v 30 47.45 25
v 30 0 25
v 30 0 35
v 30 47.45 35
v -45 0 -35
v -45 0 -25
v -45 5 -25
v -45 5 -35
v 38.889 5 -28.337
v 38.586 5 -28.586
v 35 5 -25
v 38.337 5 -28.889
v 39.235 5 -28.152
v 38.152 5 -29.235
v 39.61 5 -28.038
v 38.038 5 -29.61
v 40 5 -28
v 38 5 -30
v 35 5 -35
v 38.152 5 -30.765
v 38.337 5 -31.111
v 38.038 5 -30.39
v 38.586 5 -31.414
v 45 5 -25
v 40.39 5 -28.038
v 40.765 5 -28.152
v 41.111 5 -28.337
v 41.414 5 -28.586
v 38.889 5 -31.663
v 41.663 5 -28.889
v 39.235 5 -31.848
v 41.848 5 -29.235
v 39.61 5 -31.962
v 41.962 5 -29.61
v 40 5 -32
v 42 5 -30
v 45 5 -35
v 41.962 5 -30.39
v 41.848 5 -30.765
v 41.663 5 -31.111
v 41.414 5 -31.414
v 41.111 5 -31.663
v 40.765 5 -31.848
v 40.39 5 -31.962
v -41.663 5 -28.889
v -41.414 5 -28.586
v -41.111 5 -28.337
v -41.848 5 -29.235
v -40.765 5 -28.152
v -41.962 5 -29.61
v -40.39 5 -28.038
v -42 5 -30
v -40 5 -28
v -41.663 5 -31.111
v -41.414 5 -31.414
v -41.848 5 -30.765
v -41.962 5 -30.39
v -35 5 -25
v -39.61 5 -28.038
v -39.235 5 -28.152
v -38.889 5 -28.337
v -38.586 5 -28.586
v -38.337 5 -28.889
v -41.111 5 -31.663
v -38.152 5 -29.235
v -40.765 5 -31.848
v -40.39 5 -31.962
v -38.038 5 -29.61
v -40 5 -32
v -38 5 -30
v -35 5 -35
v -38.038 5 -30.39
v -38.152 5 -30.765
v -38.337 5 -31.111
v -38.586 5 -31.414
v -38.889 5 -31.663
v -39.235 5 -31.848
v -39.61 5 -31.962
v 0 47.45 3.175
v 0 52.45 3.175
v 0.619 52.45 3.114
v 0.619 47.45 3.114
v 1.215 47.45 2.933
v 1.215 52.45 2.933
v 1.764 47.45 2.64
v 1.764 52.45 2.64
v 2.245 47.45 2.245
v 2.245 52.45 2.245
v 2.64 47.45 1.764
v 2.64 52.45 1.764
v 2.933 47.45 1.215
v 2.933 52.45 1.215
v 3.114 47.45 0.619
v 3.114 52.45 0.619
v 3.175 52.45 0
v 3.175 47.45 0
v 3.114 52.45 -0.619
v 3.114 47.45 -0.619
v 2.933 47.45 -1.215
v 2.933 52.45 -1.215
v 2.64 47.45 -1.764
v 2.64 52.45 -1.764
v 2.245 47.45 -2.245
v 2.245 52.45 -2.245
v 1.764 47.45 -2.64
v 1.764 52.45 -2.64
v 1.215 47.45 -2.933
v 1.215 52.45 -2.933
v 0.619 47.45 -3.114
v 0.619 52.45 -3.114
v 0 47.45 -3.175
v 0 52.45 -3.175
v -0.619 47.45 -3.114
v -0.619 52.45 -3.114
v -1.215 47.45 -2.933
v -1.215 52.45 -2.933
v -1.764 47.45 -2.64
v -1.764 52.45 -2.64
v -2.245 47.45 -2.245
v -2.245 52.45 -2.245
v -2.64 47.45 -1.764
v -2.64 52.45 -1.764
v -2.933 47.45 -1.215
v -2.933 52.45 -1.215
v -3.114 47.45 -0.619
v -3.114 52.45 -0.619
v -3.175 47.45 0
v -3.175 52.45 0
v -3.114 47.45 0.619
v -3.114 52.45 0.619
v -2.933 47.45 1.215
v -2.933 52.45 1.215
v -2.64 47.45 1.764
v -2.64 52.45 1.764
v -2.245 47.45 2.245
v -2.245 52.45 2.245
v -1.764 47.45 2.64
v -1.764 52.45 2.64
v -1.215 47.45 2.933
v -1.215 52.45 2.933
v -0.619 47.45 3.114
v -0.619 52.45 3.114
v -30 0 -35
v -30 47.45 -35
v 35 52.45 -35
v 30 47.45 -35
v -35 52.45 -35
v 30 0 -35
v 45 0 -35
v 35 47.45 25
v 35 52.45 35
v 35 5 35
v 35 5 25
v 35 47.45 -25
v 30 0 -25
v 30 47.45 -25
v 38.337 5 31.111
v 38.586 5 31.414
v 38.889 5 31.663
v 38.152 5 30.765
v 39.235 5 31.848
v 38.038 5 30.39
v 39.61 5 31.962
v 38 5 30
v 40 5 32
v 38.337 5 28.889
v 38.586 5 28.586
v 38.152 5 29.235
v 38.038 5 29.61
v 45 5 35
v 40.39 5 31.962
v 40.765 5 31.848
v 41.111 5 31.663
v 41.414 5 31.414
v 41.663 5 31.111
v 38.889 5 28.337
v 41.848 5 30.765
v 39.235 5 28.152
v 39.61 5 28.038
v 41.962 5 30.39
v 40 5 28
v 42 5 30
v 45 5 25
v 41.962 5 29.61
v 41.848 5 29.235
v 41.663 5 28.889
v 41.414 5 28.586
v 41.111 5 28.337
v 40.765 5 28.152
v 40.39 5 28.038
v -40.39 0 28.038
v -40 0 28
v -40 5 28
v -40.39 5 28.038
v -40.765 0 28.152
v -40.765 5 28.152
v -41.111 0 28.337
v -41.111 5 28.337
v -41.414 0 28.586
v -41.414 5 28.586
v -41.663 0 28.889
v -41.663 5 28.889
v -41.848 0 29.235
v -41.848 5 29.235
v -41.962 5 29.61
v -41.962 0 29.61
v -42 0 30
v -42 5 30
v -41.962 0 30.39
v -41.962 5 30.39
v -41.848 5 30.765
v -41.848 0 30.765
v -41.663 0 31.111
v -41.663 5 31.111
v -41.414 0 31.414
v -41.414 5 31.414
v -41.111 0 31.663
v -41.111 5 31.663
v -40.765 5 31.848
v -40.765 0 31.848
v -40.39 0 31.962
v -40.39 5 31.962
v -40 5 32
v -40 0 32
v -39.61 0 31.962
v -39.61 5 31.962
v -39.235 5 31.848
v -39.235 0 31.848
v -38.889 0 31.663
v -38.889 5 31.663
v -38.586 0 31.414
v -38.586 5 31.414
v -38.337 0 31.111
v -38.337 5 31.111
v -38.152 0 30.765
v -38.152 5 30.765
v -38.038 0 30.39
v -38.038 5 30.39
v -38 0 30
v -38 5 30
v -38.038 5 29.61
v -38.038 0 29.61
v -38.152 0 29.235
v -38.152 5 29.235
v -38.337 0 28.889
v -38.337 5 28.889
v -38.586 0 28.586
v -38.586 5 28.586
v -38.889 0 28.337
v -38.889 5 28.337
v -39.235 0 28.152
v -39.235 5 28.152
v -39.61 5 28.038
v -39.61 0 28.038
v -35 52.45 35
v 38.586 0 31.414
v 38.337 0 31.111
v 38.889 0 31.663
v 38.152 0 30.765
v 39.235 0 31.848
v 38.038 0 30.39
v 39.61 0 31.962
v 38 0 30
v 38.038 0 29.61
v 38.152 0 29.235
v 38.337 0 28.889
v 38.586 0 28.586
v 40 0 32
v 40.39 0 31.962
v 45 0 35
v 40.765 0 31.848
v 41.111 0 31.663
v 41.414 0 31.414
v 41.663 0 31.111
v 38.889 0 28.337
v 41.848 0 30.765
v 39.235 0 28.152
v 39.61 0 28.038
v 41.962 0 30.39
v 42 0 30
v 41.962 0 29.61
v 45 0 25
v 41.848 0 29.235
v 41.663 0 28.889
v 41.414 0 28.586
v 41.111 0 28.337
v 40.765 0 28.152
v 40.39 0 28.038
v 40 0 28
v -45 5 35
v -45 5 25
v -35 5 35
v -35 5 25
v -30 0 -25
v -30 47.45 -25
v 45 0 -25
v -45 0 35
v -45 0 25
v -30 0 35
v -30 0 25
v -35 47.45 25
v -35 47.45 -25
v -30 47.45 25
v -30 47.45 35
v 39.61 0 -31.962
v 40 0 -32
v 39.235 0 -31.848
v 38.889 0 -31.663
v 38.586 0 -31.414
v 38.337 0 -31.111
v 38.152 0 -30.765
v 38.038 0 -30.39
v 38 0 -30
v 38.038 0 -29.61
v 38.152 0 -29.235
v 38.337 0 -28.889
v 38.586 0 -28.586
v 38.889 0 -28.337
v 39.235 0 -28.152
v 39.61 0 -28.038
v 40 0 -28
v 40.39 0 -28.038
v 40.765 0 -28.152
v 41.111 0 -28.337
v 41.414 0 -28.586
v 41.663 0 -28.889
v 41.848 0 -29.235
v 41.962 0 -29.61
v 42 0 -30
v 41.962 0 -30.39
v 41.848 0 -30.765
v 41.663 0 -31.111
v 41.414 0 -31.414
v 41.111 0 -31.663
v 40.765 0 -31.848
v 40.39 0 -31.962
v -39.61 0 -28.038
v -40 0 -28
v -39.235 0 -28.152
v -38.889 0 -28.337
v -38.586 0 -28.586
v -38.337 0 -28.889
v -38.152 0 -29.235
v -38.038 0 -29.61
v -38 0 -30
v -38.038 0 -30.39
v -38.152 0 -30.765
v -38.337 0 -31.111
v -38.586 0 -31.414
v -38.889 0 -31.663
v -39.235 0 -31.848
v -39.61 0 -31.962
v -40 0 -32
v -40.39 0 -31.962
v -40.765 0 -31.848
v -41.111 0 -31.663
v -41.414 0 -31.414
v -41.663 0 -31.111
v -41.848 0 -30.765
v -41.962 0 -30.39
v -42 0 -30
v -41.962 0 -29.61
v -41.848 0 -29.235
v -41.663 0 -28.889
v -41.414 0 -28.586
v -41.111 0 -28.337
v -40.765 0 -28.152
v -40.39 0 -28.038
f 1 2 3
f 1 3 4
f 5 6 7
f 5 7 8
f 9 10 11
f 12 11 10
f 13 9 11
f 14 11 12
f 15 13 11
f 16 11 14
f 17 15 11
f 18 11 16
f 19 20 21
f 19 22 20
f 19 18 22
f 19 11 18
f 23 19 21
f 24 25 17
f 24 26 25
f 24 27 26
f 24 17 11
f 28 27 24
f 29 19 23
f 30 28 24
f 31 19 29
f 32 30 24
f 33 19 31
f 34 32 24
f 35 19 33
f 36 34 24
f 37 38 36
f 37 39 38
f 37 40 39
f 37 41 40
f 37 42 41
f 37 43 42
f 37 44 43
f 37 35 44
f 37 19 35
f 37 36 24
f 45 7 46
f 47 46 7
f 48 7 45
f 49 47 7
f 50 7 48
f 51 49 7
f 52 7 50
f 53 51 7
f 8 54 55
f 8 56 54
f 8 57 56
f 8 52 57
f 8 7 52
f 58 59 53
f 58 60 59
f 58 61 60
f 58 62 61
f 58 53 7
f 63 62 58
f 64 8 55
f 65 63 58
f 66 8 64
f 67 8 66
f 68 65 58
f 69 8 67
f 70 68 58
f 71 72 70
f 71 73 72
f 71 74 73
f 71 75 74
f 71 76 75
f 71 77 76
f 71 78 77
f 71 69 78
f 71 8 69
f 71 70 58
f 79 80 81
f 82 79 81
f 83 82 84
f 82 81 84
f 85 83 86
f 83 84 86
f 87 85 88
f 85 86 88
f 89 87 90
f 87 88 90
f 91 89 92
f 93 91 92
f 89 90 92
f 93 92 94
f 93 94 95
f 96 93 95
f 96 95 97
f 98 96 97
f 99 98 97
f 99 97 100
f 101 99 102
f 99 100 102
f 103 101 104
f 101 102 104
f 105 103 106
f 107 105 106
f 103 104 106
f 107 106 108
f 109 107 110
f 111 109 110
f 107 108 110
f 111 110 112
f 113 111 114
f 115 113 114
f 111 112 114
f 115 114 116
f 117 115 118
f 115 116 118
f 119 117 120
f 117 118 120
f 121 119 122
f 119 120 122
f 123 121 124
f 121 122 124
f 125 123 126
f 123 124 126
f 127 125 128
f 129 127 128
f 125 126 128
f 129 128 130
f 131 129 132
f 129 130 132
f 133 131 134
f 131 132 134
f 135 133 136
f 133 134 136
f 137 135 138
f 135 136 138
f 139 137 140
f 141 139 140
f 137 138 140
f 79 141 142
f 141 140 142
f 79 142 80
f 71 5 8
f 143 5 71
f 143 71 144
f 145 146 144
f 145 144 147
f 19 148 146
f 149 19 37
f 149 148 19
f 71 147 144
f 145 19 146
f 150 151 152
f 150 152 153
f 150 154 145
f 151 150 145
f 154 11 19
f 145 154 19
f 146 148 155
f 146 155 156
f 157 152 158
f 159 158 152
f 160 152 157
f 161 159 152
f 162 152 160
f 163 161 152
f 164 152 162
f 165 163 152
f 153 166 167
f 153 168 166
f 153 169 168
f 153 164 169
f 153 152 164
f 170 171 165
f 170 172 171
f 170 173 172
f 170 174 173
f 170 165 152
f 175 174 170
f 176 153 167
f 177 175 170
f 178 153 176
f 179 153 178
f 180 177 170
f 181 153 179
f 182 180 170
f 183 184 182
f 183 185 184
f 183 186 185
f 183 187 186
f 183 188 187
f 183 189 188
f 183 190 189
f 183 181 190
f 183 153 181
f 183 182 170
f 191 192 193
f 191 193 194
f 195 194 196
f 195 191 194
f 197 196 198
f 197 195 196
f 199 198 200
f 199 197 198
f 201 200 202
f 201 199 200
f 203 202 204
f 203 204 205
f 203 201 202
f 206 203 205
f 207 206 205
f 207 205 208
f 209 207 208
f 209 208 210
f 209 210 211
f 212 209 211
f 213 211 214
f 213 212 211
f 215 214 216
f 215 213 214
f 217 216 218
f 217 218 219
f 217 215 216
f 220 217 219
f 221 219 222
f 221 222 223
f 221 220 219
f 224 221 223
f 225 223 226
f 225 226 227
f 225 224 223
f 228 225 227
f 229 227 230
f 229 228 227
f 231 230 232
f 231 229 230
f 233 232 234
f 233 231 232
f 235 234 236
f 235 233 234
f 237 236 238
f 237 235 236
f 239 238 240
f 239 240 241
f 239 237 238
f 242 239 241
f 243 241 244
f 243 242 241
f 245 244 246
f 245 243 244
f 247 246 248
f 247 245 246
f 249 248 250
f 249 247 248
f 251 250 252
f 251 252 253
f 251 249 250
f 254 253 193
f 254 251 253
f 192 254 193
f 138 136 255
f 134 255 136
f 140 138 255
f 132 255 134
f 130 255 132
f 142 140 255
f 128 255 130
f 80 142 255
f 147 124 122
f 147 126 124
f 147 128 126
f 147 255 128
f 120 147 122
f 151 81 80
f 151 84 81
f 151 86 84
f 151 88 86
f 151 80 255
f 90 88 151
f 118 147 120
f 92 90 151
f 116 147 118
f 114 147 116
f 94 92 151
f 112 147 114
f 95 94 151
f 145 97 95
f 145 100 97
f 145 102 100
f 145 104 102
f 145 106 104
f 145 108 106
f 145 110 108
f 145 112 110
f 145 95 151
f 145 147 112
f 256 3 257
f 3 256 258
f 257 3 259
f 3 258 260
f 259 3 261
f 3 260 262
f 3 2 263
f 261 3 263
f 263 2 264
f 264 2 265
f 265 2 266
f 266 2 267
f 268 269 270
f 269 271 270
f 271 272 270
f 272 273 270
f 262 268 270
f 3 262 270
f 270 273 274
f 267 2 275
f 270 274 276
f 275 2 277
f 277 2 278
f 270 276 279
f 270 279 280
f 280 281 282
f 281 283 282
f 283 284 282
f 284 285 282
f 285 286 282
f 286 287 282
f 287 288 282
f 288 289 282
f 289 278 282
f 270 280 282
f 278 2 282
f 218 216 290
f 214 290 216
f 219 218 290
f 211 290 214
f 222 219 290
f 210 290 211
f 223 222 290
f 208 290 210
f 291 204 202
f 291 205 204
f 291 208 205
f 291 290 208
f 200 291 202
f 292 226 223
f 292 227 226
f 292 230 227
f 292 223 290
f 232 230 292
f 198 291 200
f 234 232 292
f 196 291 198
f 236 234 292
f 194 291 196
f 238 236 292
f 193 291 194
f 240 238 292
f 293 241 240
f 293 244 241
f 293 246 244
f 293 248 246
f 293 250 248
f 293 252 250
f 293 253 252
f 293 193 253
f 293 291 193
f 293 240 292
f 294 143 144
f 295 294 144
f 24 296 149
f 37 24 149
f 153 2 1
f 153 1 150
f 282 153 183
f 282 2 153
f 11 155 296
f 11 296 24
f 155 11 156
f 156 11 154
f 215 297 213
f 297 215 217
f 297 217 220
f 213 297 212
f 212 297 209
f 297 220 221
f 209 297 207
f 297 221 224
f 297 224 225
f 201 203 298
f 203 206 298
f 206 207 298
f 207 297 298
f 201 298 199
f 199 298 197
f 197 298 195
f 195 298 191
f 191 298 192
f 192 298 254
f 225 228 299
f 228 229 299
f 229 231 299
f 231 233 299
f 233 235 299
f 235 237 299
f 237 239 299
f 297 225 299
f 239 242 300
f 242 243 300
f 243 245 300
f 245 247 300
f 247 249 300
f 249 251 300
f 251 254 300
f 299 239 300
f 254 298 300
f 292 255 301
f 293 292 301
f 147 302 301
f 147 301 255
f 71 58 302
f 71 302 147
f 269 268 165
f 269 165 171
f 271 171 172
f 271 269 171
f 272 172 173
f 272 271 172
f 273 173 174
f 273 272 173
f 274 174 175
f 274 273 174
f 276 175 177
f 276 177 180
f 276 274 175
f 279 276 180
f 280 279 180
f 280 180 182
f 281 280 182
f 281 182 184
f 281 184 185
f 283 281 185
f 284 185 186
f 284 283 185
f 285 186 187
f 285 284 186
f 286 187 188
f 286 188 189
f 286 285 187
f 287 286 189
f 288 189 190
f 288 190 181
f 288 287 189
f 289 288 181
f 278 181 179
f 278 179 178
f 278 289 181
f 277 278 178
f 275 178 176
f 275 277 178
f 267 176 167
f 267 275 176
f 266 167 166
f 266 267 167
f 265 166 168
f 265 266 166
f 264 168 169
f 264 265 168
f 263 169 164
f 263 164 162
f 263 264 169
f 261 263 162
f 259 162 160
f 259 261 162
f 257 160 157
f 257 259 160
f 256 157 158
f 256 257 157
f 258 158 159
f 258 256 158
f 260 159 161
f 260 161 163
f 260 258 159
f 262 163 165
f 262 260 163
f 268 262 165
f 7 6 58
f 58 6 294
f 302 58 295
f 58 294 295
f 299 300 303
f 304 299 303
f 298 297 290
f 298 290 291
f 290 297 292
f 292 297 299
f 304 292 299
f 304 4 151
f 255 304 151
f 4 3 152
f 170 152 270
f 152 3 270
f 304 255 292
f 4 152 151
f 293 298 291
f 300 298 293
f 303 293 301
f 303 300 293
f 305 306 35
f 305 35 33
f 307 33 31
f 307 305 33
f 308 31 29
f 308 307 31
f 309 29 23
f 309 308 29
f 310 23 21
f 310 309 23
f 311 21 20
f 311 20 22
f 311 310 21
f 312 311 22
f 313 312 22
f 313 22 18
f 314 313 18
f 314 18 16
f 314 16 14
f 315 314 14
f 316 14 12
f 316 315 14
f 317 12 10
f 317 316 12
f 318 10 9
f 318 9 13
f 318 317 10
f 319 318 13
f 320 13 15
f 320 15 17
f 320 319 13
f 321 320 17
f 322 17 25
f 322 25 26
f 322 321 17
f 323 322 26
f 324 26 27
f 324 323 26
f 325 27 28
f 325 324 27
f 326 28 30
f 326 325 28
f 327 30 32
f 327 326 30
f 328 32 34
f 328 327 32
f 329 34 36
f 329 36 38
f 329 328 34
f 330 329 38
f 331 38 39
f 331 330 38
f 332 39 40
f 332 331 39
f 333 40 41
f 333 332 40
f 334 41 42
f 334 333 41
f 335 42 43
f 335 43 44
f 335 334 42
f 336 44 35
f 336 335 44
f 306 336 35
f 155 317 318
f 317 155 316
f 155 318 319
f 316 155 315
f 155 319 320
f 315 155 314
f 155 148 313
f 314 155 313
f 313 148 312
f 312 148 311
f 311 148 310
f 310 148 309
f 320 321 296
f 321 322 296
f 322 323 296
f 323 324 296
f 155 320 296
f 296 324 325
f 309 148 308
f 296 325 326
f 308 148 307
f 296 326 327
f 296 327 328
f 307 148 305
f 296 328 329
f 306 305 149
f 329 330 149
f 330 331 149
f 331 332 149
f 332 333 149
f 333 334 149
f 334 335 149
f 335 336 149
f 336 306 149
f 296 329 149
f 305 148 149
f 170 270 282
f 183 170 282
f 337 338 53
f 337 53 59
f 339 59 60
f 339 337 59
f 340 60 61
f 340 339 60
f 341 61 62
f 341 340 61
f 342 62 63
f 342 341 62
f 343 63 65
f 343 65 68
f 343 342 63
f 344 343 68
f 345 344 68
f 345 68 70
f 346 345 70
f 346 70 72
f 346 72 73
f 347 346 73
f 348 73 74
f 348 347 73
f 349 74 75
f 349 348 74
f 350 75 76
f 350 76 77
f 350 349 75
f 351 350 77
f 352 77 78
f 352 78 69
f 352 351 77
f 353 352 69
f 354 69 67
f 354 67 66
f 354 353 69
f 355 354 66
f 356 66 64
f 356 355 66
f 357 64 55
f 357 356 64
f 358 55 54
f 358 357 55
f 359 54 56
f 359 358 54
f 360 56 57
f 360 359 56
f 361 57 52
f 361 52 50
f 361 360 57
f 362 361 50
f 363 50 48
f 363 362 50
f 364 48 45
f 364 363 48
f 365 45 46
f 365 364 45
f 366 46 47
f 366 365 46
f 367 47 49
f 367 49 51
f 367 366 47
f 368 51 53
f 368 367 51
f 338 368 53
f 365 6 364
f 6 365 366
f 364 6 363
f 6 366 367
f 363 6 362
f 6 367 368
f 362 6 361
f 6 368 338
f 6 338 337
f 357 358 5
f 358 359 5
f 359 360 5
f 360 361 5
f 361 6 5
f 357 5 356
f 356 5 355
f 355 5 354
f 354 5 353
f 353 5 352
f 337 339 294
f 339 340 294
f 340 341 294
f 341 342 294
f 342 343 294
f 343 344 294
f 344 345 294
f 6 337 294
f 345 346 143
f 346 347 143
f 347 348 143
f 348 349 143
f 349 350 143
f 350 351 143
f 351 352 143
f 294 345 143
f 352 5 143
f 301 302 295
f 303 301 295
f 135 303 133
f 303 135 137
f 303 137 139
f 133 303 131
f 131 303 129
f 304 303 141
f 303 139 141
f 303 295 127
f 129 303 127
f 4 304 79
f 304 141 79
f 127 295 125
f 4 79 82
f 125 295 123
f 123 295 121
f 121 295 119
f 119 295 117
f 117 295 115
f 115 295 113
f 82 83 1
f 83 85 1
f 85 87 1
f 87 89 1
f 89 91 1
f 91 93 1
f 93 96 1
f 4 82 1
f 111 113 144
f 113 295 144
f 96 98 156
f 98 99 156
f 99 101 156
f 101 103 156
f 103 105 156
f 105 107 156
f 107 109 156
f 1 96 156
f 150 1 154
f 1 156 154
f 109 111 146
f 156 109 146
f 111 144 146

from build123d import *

# Parameters (mm, degrees)
SKETCH1_W               = 70
SKETCH1_H               = 70
BOSS_EXTRUDE1_DEPTH     = 52.45
CUT_EXTRUDE2_DEPTH      = 95.212538974
CUT_EXTRUDE2_DEPTH_BACK = 70
SKETCH2_W               = 60
SKETCH2_H               = 47.45
SKETCH3_W               = 10
SKETCH3_H               = 10
SKETCH3_R               = 2
BOSS_EXTRUDE2_DEPTH     = 5
SKETCH4_R               = 3.175
CUT_EXTRUDE3_DEPTH      = 5
SKETCH5_W               = 50
SKETCH5_H               = 47.45
CUT_EXTRUDE4_DEPTH      = 80


with BuildPart() as part:
    # Sketch1 → Boss-Extrude1 (new body)
    with BuildSketch(Plane(origin=(0, 0, 0), x_dir=(1, 0, 0), z_dir=(0, 1, 0))):
        Rectangle(SKETCH1_W, SKETCH1_H)
    extrude(amount=BOSS_EXTRUDE1_DEPTH)

    # Sketch2 → Cut-Extrude2 (cut, two sides: drawn at the far end of the back side and taken through both)
    with BuildSketch(Plane.XY.offset(35).offset(-CUT_EXTRUDE2_DEPTH_BACK)):
        with Locations((0, 23.725)):
            Rectangle(SKETCH2_W, SKETCH2_H)
    extrude(amount=CUT_EXTRUDE2_DEPTH + CUT_EXTRUDE2_DEPTH_BACK, mode=Mode.SUBTRACT)

    # Sketch3 → Boss-Extrude2 (add)
    # profile 1 of 4: a face of its own
    with BuildSketch(Plane(origin=(0, 0, 0), x_dir=(1, 0, 0), z_dir=(0, 1, 0))):
        with Locations((40, -30)):
            Rectangle(SKETCH3_W, SKETCH3_H)
        with Locations(Location((40, -30, 0), (0, 0, 270))):
            Circle(SKETCH3_R, mode=Mode.SUBTRACT)
    # profile 2 of 4: a face of its own
    with BuildSketch(Plane(origin=(0, 0, 0), x_dir=(1, 0, 0), z_dir=(0, 1, 0))):
        with Locations((40, 30)):
            Rectangle(SKETCH3_W, SKETCH3_H)
        with Locations(Location((40, 30, 0), (0, 0, 90))):
            Circle(SKETCH3_R, mode=Mode.SUBTRACT)
    # profile 3 of 4: a face of its own
    with BuildSketch(Plane(origin=(0, 0, 0), x_dir=(1, 0, 0), z_dir=(0, 1, 0))):
        with Locations((-40, -30)):
            Rectangle(SKETCH3_W, SKETCH3_H)
        with Locations(Location((-40, -30, 0), (0, 0, 90))):
            Circle(SKETCH3_R, mode=Mode.SUBTRACT)
    # profile 4 of 4: a face of its own
    with BuildSketch(Plane(origin=(0, 0, 0), x_dir=(1, 0, 0), z_dir=(0, 1, 0))):
        with Locations((-40, 30)):
            Rectangle(SKETCH3_W, SKETCH3_H)
        with Locations(Location((-40, 30, 0), (0, 0, 270))):
            Circle(SKETCH3_R, mode=Mode.SUBTRACT)
    extrude(amount=BOSS_EXTRUDE2_DEPTH)

    # Sketch4 → Cut-Extrude3 (cut)
    with BuildSketch(Plane(origin=(0, 52.45, 0), x_dir=(1, 0, 0), z_dir=(0, 1, 0))):
        with Locations(Location((0, 0, 0), (0, 0, 270))):
            Circle(SKETCH4_R)
    extrude(amount=-CUT_EXTRUDE3_DEPTH, mode=Mode.SUBTRACT)

    # Sketch5 → Cut-Extrude4 (cut)
    with BuildSketch(Plane(origin=(35, 0, 0), x_dir=(0, 0, -1), z_dir=(1, 0, 0))):
        with Locations((0, 23.725)):
            Rectangle(SKETCH5_W, SKETCH5_H)
    extrude(amount=-CUT_EXTRUDE4_DEPTH, mode=Mode.SUBTRACT)


solid = part.part
